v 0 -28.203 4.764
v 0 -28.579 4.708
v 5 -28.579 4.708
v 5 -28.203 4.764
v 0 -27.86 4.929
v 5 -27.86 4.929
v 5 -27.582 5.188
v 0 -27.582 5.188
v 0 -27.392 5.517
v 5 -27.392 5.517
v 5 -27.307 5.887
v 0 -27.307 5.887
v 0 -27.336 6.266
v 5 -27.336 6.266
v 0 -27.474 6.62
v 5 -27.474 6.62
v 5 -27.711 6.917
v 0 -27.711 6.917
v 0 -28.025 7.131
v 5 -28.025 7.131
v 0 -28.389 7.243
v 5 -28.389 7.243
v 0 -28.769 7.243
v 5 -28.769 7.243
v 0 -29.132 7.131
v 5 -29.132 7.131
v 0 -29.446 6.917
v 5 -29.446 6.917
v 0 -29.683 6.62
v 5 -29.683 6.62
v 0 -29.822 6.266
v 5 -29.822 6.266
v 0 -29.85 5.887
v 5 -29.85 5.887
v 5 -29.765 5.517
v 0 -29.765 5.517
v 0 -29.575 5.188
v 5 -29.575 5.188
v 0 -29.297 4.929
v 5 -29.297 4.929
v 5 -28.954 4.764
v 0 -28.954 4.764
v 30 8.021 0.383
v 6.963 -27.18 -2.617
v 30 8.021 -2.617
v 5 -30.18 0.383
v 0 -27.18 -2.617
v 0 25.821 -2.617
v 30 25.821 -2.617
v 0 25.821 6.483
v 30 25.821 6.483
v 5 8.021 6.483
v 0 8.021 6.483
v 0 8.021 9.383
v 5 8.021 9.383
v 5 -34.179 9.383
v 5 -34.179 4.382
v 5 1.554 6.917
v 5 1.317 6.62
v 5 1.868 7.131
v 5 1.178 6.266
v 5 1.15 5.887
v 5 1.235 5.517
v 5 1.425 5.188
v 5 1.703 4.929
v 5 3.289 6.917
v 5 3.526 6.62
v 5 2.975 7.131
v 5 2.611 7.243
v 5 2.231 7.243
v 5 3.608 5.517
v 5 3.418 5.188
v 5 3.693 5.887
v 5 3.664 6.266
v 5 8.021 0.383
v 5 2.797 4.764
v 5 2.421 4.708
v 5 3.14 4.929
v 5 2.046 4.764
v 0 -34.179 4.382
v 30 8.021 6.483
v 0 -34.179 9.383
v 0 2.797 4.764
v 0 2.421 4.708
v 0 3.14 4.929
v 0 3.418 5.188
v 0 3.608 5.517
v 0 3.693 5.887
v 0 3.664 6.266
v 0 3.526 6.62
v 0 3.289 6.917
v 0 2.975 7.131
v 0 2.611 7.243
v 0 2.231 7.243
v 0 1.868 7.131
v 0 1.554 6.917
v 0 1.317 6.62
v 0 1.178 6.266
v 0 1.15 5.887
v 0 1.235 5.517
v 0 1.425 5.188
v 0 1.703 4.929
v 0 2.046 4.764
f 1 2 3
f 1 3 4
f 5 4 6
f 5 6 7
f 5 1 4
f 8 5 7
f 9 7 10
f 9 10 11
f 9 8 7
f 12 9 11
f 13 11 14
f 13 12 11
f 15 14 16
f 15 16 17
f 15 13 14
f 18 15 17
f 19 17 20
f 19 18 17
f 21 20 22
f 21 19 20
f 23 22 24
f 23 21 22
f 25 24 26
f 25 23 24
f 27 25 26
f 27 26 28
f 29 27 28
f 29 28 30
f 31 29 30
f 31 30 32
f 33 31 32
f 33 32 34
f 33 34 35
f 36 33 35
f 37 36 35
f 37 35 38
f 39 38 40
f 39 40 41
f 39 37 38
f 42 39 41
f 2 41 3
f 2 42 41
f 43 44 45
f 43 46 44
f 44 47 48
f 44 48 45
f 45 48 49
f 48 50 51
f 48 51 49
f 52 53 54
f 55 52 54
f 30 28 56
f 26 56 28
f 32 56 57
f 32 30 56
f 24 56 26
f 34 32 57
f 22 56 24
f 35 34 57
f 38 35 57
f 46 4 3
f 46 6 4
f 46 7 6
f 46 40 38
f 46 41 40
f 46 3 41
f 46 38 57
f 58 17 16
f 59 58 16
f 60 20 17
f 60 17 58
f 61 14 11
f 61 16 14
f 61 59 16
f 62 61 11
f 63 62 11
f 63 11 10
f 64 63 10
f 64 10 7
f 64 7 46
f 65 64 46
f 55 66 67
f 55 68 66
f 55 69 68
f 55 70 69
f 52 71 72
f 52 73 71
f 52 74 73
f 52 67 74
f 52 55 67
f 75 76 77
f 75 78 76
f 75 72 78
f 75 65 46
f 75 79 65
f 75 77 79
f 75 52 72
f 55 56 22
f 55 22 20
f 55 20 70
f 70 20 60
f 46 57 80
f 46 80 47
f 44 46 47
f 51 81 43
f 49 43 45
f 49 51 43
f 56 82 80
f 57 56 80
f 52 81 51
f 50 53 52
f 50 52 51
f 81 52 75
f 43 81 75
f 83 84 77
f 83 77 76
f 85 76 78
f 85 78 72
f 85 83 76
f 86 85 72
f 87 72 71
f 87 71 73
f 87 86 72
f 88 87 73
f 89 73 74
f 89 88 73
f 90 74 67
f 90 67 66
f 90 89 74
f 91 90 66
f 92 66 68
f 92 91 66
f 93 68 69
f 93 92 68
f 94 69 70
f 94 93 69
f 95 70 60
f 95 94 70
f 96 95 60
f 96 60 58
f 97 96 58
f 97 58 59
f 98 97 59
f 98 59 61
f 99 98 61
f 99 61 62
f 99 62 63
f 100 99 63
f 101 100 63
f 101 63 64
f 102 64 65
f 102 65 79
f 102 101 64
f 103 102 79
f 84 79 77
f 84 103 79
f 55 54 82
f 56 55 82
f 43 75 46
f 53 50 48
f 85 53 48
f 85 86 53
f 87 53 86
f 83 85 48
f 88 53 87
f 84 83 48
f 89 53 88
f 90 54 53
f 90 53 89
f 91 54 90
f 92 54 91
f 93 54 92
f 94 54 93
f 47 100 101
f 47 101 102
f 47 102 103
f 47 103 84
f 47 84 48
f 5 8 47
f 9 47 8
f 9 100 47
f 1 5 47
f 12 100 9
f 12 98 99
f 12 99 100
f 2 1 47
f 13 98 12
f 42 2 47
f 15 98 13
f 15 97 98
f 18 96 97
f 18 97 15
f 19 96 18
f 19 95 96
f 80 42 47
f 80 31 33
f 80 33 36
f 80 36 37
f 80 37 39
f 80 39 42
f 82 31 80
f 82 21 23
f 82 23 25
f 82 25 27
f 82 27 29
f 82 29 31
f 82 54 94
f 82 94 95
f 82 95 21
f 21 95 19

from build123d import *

# Parameters (mm, degrees)
SKETCH1_R           = 1.275
BOSS_EXTRUDE1_DEPTH = 5
SKETCH2_W           = 9.1
SKETCH2_H           = 17.8
BOSS_EXTRUDE2_DEPTH = 25
BOSS_EXTRUDE3_DEPTH = 3
CUT_EXTRUDE1_DEPTH  = 15


with BuildPart() as part:
    # Sketch1 → Boss-Extrude1 (new body)
    # profile 1 of 2: a face of its own
    with BuildSketch(Plane(origin=(0, 0, 0), x_dir=(0, 0, -1), z_dir=(1, 0, 0))):
        Polygon((-4.381647728, -34.17856484), (-0.382647728, -30.17956484), (-0.382647728, 8.02143516), (-6.482647728, 8.02143516), (-9.382647728, 8.02143516), (-9.382647728, -34.17856484), align=None)
        with Locations((-5.982647728, 2.42143516)):
            Circle(SKETCH1_R, mode=Mode.SUBTRACT)
        with Locations((-5.982647728, -28.57856484)):
            Circle(SKETCH1_R, mode=Mode.SUBTRACT)
    # profile 2 of 2: a face of its own
    with BuildSketch(Plane(origin=(0, 0, 0), x_dir=(0, 0, -1), z_dir=(1, 0, 0))):
        Polygon((2.617352272, 8.02143516), (2.617352272, 25.82143516), (-6.482647728, 25.82143516), (-6.482647728, 8.02143516), (-0.382647728, 8.02143516), align=None)
    extrude(amount=BOSS_EXTRUDE1_DEPTH)

    # Sketch2 → Boss-Extrude2 (add)
    with BuildSketch(Plane(origin=(5, 0, 0), x_dir=(0, 0, -1), z_dir=(1, 0, 0))):
        with Locations((-1.932647728, 16.92143516)):
            Rectangle(SKETCH2_W, SKETCH2_H)
    extrude(amount=BOSS_EXTRUDE2_DEPTH)

    # Sketch3 → Boss-Extrude3 (add)
    with BuildSketch(Plane(origin=(0, 0, 0.382647728), x_dir=(-1, 0, 0), z_dir=(0, 0, -1))):
        Polygon((-30, 8.02143516), (0, 8.02143516), (0, -30.17956484), (-5, -30.17956484), align=None)
    extrude(amount=BOSS_EXTRUDE3_DEPTH)

    # Sketch4 → Cut-Extrude1 (cut, symmetric)
    with BuildSketch(Plane(origin=(5, 0, 0), x_dir=(0, 0, -1), z_dir=(1, 0, 0))):
        Polygon((-0.382647728, -30.17956484), (2.617352272, -27.17956484), (2.617352272, -30.17956484), align=None)
    extrude(amount=CUT_EXTRUDE1_DEPTH, both=True, mode=Mode.SUBTRACT)


solid = part.part
